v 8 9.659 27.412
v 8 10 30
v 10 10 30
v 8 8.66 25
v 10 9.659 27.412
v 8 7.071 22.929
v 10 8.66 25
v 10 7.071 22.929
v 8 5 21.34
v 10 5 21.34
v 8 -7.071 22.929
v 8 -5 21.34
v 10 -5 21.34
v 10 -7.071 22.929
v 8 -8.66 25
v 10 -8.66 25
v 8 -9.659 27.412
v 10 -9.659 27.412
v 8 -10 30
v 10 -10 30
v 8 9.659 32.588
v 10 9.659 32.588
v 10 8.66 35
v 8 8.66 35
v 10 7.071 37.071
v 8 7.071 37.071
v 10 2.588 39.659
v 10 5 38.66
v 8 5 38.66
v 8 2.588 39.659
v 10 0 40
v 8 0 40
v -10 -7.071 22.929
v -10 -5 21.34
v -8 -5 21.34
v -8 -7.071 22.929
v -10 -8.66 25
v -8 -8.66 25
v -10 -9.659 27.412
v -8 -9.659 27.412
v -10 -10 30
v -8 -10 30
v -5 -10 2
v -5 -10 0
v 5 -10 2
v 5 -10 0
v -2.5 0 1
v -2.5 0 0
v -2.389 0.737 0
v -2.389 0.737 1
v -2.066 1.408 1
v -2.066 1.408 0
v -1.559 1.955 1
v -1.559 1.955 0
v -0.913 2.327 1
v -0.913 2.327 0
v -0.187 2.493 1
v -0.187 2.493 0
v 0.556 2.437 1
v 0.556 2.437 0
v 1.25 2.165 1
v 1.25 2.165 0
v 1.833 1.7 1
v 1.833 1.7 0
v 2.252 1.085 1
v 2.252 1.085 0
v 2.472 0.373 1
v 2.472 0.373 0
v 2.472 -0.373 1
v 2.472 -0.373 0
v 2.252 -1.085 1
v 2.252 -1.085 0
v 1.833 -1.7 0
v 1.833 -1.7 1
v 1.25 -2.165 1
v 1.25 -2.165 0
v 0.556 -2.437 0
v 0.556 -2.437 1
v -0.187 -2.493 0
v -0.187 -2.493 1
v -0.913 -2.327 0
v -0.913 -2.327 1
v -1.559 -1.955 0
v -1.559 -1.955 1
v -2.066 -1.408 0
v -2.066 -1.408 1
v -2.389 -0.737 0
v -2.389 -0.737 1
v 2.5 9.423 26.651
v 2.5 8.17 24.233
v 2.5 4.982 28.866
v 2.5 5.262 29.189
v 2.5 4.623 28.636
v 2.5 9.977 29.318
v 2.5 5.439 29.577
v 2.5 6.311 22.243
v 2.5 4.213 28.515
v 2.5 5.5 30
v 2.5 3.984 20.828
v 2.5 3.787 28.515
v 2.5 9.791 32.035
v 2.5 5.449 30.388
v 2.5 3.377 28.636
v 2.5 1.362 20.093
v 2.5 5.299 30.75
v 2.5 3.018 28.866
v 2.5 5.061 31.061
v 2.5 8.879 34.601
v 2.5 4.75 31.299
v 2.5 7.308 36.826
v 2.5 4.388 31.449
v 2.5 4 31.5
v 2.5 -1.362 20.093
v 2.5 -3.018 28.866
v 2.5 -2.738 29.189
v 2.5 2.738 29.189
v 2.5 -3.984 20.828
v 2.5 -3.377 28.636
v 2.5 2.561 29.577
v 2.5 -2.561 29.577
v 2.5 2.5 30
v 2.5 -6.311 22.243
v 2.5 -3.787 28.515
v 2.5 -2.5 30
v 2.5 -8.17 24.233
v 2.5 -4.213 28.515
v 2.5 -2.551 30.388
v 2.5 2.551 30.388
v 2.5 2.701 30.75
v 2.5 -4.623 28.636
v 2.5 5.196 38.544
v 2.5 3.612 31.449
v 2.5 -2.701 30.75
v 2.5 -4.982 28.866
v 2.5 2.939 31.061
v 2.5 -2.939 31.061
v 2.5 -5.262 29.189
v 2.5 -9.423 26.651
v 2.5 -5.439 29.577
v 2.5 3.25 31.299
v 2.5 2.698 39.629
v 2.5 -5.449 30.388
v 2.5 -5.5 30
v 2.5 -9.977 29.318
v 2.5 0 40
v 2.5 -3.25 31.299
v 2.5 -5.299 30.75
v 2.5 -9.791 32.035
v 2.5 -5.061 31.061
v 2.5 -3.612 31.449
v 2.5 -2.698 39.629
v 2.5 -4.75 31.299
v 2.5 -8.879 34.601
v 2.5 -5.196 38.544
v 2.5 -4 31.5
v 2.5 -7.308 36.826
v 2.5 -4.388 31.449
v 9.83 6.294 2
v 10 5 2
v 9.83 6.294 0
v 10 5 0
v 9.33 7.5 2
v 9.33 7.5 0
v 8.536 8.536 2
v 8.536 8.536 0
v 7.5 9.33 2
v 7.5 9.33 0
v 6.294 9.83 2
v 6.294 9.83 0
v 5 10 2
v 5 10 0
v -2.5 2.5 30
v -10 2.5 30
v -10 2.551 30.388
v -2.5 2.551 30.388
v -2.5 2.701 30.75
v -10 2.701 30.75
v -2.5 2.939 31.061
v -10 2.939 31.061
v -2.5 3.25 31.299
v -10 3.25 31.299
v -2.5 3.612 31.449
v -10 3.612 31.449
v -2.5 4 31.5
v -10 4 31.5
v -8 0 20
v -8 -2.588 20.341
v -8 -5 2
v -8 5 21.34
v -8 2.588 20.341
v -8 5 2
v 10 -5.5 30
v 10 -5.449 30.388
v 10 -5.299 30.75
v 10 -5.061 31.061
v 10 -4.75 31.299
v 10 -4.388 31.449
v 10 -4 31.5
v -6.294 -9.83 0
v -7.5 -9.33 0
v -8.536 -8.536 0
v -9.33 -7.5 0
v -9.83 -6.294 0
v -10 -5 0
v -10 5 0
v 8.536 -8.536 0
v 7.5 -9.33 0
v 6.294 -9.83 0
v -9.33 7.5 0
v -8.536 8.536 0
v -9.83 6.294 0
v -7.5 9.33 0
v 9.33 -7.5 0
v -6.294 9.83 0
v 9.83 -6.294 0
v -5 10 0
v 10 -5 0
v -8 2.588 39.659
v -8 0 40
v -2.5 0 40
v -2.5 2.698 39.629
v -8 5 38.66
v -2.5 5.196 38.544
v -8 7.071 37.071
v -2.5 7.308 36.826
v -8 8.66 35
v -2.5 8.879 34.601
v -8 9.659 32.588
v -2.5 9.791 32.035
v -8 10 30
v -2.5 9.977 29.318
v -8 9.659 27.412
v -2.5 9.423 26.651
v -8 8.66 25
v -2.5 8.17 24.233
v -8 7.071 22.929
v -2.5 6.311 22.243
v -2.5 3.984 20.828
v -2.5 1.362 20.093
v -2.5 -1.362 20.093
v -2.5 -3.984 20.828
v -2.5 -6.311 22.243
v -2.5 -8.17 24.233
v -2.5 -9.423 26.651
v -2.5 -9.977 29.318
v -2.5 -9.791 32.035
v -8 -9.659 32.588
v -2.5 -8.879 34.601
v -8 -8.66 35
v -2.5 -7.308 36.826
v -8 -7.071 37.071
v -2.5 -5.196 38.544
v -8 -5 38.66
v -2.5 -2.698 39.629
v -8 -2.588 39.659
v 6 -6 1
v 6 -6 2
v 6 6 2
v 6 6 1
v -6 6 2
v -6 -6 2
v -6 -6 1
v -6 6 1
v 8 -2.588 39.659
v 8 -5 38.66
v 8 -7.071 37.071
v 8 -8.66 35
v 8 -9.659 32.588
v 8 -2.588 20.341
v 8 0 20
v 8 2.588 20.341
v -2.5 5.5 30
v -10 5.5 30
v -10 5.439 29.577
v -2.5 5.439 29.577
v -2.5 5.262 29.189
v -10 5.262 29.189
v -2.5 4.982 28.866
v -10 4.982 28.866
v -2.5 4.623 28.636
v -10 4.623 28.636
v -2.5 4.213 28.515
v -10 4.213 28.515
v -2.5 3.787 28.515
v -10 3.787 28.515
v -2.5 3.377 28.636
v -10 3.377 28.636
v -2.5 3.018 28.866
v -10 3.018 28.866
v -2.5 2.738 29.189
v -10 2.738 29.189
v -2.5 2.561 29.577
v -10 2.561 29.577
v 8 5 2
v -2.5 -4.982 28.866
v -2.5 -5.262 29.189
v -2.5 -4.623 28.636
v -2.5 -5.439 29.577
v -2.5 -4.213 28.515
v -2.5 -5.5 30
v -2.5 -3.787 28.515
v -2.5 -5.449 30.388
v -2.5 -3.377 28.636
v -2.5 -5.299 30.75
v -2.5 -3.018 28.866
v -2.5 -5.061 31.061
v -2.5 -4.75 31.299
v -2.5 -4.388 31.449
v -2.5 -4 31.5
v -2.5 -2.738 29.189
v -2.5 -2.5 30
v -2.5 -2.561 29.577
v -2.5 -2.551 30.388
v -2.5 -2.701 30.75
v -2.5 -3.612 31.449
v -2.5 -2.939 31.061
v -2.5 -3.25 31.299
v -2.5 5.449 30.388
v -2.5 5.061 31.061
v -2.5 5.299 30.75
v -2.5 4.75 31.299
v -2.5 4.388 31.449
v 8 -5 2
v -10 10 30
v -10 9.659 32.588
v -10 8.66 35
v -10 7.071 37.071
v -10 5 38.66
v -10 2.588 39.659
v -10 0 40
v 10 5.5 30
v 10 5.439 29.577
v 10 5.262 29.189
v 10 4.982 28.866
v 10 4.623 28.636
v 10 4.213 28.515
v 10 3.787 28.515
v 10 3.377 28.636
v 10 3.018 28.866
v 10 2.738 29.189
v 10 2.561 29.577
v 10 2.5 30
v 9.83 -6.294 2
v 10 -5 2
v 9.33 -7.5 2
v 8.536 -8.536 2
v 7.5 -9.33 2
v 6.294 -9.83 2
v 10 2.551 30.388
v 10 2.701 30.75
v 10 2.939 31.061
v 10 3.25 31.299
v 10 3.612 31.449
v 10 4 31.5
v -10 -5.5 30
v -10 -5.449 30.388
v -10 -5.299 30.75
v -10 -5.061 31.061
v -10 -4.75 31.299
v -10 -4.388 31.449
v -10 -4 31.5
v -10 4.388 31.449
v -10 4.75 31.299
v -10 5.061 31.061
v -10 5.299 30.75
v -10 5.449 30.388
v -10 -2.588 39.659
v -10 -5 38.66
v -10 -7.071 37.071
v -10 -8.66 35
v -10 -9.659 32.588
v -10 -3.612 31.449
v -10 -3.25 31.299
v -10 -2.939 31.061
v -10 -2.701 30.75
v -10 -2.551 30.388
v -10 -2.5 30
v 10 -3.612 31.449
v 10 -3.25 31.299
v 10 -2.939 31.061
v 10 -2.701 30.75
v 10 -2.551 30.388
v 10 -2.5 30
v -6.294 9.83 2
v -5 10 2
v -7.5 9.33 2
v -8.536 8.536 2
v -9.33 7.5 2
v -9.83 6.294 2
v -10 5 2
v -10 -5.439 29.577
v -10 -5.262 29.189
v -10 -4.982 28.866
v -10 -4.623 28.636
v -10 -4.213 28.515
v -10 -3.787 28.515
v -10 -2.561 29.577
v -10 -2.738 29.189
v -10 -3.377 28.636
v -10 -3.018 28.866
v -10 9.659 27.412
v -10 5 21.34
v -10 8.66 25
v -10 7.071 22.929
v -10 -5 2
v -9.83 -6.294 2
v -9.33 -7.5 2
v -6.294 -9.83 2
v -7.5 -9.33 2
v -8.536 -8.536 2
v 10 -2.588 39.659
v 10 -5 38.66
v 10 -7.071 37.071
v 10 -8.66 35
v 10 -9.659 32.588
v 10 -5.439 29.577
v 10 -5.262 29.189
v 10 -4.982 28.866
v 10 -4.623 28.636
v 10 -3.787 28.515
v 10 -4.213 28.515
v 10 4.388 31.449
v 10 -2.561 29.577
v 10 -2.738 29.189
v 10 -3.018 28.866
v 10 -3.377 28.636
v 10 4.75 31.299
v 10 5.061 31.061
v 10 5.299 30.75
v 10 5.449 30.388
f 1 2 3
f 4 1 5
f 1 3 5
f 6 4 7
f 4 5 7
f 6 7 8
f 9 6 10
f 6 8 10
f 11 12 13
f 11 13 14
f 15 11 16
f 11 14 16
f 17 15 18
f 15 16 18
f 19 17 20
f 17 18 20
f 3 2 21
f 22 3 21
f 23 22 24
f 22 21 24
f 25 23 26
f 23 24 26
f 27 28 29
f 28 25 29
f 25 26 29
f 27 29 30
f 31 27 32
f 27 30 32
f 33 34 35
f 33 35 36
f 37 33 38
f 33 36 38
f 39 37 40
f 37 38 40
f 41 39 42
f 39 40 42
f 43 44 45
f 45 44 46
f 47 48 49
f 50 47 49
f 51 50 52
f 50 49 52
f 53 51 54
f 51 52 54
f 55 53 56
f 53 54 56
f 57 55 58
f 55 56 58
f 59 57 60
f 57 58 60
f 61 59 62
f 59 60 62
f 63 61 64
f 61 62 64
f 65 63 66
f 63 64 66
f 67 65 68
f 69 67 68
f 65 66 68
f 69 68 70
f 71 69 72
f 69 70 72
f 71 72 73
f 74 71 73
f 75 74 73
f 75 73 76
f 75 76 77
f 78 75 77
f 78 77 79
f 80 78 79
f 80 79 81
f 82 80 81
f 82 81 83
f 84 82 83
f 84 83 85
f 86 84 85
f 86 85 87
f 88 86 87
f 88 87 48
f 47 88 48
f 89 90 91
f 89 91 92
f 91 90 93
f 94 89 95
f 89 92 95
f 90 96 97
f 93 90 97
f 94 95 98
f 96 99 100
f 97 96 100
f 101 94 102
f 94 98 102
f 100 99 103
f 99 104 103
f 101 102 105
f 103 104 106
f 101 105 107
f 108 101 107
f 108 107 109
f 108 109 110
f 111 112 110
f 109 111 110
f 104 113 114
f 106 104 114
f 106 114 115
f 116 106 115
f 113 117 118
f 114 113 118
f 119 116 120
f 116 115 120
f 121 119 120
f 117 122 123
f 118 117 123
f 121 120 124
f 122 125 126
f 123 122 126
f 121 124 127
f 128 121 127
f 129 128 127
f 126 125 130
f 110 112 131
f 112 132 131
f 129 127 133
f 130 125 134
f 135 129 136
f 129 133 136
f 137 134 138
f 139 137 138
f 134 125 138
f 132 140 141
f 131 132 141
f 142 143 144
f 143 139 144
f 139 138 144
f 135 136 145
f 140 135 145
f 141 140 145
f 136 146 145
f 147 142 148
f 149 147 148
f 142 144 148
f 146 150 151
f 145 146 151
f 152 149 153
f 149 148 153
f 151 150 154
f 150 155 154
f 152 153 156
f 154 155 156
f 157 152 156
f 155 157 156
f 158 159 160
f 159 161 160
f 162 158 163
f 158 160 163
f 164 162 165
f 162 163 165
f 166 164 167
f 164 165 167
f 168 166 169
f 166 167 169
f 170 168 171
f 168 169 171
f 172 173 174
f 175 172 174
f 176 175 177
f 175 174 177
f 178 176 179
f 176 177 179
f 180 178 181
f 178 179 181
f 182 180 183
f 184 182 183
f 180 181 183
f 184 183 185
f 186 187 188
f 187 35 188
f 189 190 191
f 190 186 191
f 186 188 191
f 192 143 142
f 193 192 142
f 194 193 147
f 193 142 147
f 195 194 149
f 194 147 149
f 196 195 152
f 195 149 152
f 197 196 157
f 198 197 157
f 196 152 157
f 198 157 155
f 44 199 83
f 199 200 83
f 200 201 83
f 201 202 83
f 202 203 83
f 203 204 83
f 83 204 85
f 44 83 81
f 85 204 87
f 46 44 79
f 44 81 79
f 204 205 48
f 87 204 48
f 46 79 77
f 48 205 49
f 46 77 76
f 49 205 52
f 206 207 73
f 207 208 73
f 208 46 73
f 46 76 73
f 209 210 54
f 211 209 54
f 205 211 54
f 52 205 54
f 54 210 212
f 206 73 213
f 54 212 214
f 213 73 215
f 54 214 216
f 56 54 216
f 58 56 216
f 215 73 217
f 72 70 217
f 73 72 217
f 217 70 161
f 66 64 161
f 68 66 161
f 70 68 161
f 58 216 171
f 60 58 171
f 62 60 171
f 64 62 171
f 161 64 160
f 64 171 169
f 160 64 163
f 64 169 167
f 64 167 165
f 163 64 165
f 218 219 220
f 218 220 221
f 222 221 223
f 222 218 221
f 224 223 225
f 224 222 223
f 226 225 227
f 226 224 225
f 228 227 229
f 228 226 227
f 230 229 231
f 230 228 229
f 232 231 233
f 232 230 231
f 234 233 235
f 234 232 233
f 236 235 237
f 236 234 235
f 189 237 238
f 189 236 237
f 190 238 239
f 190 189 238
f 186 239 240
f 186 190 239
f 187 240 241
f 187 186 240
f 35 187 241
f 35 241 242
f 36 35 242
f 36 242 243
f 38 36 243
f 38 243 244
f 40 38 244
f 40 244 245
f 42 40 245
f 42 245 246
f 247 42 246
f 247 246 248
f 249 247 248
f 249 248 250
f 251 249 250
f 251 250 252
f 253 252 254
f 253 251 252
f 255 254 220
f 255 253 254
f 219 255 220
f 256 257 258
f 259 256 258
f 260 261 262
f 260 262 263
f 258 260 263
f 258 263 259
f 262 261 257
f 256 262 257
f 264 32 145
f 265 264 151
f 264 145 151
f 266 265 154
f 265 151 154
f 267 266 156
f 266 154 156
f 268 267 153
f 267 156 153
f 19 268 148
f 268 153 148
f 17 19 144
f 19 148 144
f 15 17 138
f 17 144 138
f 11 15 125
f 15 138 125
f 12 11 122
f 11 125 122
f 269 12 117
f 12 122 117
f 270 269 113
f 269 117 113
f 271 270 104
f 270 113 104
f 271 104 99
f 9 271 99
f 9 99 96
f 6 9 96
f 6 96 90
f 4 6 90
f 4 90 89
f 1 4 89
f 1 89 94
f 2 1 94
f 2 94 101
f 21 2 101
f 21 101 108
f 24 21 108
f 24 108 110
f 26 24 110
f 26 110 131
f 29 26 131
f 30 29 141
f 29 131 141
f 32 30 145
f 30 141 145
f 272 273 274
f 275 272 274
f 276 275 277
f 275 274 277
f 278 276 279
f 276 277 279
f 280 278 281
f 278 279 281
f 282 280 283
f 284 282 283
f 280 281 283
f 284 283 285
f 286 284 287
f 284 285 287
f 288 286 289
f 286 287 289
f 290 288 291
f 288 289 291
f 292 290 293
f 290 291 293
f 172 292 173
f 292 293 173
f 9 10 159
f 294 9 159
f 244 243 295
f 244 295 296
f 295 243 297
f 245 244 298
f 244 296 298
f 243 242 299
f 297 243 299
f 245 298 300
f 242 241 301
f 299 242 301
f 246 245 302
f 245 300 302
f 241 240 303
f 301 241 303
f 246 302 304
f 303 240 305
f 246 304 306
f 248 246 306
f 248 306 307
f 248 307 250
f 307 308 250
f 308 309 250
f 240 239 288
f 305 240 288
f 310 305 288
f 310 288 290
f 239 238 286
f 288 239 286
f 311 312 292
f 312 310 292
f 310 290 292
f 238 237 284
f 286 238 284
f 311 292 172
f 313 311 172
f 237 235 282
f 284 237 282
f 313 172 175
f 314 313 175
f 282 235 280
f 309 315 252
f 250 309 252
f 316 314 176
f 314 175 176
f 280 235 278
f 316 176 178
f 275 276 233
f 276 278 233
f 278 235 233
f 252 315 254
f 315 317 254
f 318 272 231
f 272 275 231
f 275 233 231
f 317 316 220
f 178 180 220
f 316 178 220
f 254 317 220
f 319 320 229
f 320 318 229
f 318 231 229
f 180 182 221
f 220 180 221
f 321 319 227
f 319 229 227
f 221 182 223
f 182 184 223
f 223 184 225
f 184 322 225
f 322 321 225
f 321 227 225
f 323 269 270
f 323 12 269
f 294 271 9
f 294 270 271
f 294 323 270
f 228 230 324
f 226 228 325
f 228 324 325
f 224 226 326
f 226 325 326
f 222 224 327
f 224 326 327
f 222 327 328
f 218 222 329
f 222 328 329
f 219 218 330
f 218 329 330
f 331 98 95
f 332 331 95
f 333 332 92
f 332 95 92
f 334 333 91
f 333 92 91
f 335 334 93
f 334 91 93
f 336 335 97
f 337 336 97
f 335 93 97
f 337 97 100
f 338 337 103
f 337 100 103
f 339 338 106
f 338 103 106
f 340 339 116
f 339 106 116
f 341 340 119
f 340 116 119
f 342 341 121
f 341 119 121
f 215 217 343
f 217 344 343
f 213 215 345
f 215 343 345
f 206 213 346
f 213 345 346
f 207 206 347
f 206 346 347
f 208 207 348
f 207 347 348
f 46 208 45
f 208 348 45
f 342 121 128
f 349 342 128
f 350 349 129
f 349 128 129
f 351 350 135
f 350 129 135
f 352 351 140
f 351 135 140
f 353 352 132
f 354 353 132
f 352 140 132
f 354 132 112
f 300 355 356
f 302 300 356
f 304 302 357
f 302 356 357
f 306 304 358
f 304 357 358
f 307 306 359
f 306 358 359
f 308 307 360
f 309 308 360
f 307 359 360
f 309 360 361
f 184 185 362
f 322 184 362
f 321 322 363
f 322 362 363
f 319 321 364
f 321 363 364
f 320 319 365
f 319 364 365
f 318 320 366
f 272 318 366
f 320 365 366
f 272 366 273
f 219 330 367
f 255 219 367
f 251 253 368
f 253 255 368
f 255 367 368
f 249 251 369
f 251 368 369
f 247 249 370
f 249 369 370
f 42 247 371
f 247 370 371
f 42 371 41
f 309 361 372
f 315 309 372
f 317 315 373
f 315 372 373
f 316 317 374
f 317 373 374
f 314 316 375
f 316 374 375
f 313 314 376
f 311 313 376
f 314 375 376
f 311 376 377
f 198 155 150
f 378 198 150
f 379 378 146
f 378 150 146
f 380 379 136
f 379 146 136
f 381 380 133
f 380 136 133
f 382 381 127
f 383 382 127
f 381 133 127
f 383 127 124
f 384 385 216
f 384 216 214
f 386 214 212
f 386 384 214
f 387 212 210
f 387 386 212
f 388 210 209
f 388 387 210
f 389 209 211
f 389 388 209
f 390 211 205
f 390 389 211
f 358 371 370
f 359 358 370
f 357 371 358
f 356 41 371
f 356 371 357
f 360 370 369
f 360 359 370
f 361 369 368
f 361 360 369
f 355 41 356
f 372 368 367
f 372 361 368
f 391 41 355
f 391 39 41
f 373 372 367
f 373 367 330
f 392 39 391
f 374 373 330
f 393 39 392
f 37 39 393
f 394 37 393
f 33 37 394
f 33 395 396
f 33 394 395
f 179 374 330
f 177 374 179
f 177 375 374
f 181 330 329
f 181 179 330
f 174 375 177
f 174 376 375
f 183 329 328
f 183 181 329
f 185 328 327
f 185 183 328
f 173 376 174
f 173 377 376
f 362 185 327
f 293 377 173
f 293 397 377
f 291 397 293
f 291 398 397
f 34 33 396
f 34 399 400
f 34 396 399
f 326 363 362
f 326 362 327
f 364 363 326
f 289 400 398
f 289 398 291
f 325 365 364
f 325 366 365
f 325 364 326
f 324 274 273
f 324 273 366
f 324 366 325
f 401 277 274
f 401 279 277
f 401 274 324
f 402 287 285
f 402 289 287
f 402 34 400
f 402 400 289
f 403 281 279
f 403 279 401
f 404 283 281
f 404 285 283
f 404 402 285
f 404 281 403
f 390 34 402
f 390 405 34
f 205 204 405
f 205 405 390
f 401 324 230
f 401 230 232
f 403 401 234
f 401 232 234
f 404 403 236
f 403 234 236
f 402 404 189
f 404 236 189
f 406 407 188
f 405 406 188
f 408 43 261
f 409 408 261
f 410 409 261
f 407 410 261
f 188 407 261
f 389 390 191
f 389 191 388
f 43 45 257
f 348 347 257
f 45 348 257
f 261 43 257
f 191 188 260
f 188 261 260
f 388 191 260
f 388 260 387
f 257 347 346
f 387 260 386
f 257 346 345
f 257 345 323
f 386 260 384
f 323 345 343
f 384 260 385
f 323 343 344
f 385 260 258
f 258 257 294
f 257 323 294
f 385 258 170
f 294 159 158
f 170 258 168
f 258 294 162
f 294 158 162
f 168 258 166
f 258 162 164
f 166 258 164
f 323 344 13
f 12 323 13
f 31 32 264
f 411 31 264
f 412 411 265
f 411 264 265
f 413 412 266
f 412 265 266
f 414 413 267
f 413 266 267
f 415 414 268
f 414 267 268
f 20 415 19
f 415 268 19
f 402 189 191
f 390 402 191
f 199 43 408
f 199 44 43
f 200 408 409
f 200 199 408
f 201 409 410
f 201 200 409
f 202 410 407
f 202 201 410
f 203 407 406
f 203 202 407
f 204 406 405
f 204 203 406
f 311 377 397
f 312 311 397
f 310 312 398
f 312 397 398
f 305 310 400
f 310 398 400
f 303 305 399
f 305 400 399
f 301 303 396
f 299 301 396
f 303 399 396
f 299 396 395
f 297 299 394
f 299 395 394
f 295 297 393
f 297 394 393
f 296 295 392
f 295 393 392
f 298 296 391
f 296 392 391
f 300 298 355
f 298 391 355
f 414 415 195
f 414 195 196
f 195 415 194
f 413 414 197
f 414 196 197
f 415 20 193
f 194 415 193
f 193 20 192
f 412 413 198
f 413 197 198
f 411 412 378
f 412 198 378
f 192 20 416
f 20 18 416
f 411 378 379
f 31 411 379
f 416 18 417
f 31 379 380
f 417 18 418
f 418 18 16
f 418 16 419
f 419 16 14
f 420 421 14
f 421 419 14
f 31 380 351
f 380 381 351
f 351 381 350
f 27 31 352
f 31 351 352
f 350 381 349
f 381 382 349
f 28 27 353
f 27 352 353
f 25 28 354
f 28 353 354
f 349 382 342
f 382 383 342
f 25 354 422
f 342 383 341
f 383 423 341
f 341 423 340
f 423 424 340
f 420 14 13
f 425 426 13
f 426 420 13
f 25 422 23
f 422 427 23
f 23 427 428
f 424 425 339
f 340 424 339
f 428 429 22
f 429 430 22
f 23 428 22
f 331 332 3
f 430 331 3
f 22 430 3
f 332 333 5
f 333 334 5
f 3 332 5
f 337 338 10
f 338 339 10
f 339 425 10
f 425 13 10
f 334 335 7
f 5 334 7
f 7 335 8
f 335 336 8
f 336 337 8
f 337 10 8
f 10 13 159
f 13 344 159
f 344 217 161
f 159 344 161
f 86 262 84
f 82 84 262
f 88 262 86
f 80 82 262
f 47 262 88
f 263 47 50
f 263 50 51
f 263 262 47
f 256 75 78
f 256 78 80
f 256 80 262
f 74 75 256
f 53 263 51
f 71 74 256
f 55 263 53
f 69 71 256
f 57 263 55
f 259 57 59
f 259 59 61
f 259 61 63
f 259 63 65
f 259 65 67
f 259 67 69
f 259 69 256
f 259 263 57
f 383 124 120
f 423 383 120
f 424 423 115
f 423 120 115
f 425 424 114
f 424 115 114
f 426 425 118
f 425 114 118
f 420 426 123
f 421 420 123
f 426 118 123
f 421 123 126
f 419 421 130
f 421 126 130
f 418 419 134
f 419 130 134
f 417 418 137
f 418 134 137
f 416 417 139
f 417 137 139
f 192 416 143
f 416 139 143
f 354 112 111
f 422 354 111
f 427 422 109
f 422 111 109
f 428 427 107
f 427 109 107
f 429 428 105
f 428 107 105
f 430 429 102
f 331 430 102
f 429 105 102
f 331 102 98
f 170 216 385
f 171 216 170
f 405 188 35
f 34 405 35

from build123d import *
from build123d.topology import SkipClean

# Parameters (mm, degrees)
SKETCH1_W           = 20
SKETCH1_H           = 20
BOSS_EXTRUDE1_DEPTH = 2
SKETCH3_R           = 2.5
CUT_EXTRUDE1_DEPTH  = 15.282857
SKETCH4_W           = 12
SKETCH4_H           = 12
CUT_EXTRUDE2_DEPTH  = 1
SKETCH5_W           = 2
SKETCH5_H           = 20
BOSS_EXTRUDE2_DEPTH = 38
CUT_EXTRUDE3_DEPTH  = 46.825757
SKETCH7_R           = 10
BOSS_EXTRUDE3_DEPTH = 7.5
BOSS_EXTRUDE4_START = -7.5
SKETCH8_R           = 10
BOSS_EXTRUDE4_DEPTH = 7.5
CUT_EXTRUDE4_DEPTH  = 46.825757
CUT_EXTRUDE5_DEPTH  = 46.825757
FILLET1_R           = 5
FILLET2_R           = 5
FILLET3_R           = 5
FILLET4_R           = 5


with BuildPart() as part:
    # Sketch1 → Boss-Extrude1 (new body)
    with BuildSketch(Plane.XY):
        Rectangle(SKETCH1_W, SKETCH1_H)
    extrude(amount=BOSS_EXTRUDE1_DEPTH)

    # Sketch3 → Cut-Extrude1 (cut, through all)
    with BuildSketch(Plane(origin=(0, 0, 0), x_dir=(-1, 0, 0), z_dir=(0, 0, -1))):
        Circle(SKETCH3_R)
    extrude(amount=-CUT_EXTRUDE1_DEPTH, mode=Mode.SUBTRACT)

    # Sketch4 → Cut-Extrude2 (cut)
    with BuildSketch(Plane.XY.offset(2)):
        Rectangle(SKETCH4_W, SKETCH4_H)
    extrude(amount=-CUT_EXTRUDE2_DEPTH, mode=Mode.SUBTRACT)

    # Sketch5 → Boss-Extrude2 (add)
    with BuildSketch(Plane.XY.offset(2)):
        with Locations((9, 0)):
            Rectangle(SKETCH5_W, SKETCH5_H)
        with Locations((-9, 0)):
            Rectangle(SKETCH5_W, SKETCH5_H)
    extrude(amount=BOSS_EXTRUDE2_DEPTH)

    # Sketch6 → Cut-Extrude3 (cut, through all)
    with BuildSketch(Plane.ZY.offset(10)):
        with BuildLine():
            Line((40, 10), (30, 10))
            ThreePointArc((30, 10), (37.071068, 7.071068), (40, 0))
            Line((40, 0), (40, 10))
        make_face()
        with BuildLine():
            Line((40, -10), (40, 0))
            ThreePointArc((40, 0), (37.071068, -7.071068), (30, -10))
            Line((30, -10), (40, -10))
        make_face()
    extrude(amount=-CUT_EXTRUDE3_DEPTH, mode=Mode.SUBTRACT)

    # Sketch7 → Boss-Extrude3 (add)
    with SkipClean():  # the faces are left unmerged after this step: merging them gives an invalid solid
        with BuildSketch(Plane.ZY.offset(10)):
            with Locations((30, 0)):
                Circle(SKETCH7_R)
        extrude(amount=-BOSS_EXTRUDE3_DEPTH)

    # Sketch8 → Boss-Extrude4 (add)
    with SkipClean():  # the faces are left unmerged after this step: merging them gives an invalid solid
        with BuildSketch(Plane(origin=(10, 0, 0), x_dir=(0, 0, -1), z_dir=(1, 0, 0)).offset(BOSS_EXTRUDE4_START)):
            with Locations(Location((-30, 0, 0), (0, 0, 180))):
                Circle(SKETCH8_R)
        extrude(amount=BOSS_EXTRUDE4_DEPTH)

    # Sketch9 → Cut-Extrude4 (cut, through all)
    with SkipClean():  # the faces are left unmerged after this step: merging them gives an invalid solid
        with BuildSketch(Plane.ZY.offset(10)):
            with BuildLine():
                ThreePointArc((31.5, 4), (31.06066, 5.06066), (30, 5.5))
                Line((30, 5.5), (30, 2.5))
                ThreePointArc((30, 2.5), (31.06066, 2.93934), (31.5, 4))
            make_face()
            with BuildLine():
                Line((30, 2.5), (30, 5.5))
                ThreePointArc((30, 5.5), (28.5, 4), (30, 2.5))
            make_face()
            with BuildLine():
                ThreePointArc((31.5, -4), (31.06066, -2.93934), (30, -2.5))
                Line((30, -2.5), (30, -5.5))
                ThreePointArc((30, -5.5), (31.06066, -5.06066), (31.5, -4))
            make_face()
            with BuildLine():
                Line((30, -5.5), (30, -2.5))
                ThreePointArc((30, -2.5), (28.5, -4), (30, -5.5))
            make_face()
        extrude(amount=-CUT_EXTRUDE4_DEPTH, mode=Mode.SUBTRACT)

    # Sketch11 → Cut-Extrude5 (cut, through all)
    with SkipClean():  # the faces are left unmerged after this step: merging them gives an invalid solid
        with BuildSketch(Plane(origin=(10, 0, 0), x_dir=(0, 0, -1), z_dir=(1, 0, 0))):
            with BuildLine():
                Line((-30, -10), (-2, -10))
                Line((-2, -10), (-2, -5))
                Line((-2, -5), (-21.339746, -5))
                ThreePointArc((-21.339746, -5), (-25, -8.660254), (-30, -10))
            make_face()
            with BuildLine():
                Line((-2, 10), (-30, 10))
                ThreePointArc((-30, 10), (-25, 8.660254), (-21.339746, 5))
                Line((-21.339746, 5), (-2, 5))
                Line((-2, 5), (-2, 10))
            make_face()
        extrude(amount=-CUT_EXTRUDE5_DEPTH, mode=Mode.SUBTRACT)

    # Fillet1
    fillet1_edges = [part.edges().sort_by_distance(p)[0] for p in [
        (-10, 10, 1),
    ]]
    fillet(fillet1_edges, radius=FILLET1_R)

    # Fillet2
    fillet2_edges = [part.edges().sort_by_distance(p)[0] for p in [
        (10, 10, 1),
    ]]
    fillet(fillet2_edges, radius=FILLET2_R)

    # Fillet3
    fillet3_edges = [part.edges().sort_by_distance(p)[0] for p in [
        (10, -10, 1),
    ]]
    fillet(fillet3_edges, radius=FILLET3_R)

    # Fillet4
    fillet4_edges = [part.edges().sort_by_distance(p)[0] for p in [
        (-10, -10, 1),
    ]]
    fillet(fillet4_edges, radius=FILLET4_R)


solid = part.part
